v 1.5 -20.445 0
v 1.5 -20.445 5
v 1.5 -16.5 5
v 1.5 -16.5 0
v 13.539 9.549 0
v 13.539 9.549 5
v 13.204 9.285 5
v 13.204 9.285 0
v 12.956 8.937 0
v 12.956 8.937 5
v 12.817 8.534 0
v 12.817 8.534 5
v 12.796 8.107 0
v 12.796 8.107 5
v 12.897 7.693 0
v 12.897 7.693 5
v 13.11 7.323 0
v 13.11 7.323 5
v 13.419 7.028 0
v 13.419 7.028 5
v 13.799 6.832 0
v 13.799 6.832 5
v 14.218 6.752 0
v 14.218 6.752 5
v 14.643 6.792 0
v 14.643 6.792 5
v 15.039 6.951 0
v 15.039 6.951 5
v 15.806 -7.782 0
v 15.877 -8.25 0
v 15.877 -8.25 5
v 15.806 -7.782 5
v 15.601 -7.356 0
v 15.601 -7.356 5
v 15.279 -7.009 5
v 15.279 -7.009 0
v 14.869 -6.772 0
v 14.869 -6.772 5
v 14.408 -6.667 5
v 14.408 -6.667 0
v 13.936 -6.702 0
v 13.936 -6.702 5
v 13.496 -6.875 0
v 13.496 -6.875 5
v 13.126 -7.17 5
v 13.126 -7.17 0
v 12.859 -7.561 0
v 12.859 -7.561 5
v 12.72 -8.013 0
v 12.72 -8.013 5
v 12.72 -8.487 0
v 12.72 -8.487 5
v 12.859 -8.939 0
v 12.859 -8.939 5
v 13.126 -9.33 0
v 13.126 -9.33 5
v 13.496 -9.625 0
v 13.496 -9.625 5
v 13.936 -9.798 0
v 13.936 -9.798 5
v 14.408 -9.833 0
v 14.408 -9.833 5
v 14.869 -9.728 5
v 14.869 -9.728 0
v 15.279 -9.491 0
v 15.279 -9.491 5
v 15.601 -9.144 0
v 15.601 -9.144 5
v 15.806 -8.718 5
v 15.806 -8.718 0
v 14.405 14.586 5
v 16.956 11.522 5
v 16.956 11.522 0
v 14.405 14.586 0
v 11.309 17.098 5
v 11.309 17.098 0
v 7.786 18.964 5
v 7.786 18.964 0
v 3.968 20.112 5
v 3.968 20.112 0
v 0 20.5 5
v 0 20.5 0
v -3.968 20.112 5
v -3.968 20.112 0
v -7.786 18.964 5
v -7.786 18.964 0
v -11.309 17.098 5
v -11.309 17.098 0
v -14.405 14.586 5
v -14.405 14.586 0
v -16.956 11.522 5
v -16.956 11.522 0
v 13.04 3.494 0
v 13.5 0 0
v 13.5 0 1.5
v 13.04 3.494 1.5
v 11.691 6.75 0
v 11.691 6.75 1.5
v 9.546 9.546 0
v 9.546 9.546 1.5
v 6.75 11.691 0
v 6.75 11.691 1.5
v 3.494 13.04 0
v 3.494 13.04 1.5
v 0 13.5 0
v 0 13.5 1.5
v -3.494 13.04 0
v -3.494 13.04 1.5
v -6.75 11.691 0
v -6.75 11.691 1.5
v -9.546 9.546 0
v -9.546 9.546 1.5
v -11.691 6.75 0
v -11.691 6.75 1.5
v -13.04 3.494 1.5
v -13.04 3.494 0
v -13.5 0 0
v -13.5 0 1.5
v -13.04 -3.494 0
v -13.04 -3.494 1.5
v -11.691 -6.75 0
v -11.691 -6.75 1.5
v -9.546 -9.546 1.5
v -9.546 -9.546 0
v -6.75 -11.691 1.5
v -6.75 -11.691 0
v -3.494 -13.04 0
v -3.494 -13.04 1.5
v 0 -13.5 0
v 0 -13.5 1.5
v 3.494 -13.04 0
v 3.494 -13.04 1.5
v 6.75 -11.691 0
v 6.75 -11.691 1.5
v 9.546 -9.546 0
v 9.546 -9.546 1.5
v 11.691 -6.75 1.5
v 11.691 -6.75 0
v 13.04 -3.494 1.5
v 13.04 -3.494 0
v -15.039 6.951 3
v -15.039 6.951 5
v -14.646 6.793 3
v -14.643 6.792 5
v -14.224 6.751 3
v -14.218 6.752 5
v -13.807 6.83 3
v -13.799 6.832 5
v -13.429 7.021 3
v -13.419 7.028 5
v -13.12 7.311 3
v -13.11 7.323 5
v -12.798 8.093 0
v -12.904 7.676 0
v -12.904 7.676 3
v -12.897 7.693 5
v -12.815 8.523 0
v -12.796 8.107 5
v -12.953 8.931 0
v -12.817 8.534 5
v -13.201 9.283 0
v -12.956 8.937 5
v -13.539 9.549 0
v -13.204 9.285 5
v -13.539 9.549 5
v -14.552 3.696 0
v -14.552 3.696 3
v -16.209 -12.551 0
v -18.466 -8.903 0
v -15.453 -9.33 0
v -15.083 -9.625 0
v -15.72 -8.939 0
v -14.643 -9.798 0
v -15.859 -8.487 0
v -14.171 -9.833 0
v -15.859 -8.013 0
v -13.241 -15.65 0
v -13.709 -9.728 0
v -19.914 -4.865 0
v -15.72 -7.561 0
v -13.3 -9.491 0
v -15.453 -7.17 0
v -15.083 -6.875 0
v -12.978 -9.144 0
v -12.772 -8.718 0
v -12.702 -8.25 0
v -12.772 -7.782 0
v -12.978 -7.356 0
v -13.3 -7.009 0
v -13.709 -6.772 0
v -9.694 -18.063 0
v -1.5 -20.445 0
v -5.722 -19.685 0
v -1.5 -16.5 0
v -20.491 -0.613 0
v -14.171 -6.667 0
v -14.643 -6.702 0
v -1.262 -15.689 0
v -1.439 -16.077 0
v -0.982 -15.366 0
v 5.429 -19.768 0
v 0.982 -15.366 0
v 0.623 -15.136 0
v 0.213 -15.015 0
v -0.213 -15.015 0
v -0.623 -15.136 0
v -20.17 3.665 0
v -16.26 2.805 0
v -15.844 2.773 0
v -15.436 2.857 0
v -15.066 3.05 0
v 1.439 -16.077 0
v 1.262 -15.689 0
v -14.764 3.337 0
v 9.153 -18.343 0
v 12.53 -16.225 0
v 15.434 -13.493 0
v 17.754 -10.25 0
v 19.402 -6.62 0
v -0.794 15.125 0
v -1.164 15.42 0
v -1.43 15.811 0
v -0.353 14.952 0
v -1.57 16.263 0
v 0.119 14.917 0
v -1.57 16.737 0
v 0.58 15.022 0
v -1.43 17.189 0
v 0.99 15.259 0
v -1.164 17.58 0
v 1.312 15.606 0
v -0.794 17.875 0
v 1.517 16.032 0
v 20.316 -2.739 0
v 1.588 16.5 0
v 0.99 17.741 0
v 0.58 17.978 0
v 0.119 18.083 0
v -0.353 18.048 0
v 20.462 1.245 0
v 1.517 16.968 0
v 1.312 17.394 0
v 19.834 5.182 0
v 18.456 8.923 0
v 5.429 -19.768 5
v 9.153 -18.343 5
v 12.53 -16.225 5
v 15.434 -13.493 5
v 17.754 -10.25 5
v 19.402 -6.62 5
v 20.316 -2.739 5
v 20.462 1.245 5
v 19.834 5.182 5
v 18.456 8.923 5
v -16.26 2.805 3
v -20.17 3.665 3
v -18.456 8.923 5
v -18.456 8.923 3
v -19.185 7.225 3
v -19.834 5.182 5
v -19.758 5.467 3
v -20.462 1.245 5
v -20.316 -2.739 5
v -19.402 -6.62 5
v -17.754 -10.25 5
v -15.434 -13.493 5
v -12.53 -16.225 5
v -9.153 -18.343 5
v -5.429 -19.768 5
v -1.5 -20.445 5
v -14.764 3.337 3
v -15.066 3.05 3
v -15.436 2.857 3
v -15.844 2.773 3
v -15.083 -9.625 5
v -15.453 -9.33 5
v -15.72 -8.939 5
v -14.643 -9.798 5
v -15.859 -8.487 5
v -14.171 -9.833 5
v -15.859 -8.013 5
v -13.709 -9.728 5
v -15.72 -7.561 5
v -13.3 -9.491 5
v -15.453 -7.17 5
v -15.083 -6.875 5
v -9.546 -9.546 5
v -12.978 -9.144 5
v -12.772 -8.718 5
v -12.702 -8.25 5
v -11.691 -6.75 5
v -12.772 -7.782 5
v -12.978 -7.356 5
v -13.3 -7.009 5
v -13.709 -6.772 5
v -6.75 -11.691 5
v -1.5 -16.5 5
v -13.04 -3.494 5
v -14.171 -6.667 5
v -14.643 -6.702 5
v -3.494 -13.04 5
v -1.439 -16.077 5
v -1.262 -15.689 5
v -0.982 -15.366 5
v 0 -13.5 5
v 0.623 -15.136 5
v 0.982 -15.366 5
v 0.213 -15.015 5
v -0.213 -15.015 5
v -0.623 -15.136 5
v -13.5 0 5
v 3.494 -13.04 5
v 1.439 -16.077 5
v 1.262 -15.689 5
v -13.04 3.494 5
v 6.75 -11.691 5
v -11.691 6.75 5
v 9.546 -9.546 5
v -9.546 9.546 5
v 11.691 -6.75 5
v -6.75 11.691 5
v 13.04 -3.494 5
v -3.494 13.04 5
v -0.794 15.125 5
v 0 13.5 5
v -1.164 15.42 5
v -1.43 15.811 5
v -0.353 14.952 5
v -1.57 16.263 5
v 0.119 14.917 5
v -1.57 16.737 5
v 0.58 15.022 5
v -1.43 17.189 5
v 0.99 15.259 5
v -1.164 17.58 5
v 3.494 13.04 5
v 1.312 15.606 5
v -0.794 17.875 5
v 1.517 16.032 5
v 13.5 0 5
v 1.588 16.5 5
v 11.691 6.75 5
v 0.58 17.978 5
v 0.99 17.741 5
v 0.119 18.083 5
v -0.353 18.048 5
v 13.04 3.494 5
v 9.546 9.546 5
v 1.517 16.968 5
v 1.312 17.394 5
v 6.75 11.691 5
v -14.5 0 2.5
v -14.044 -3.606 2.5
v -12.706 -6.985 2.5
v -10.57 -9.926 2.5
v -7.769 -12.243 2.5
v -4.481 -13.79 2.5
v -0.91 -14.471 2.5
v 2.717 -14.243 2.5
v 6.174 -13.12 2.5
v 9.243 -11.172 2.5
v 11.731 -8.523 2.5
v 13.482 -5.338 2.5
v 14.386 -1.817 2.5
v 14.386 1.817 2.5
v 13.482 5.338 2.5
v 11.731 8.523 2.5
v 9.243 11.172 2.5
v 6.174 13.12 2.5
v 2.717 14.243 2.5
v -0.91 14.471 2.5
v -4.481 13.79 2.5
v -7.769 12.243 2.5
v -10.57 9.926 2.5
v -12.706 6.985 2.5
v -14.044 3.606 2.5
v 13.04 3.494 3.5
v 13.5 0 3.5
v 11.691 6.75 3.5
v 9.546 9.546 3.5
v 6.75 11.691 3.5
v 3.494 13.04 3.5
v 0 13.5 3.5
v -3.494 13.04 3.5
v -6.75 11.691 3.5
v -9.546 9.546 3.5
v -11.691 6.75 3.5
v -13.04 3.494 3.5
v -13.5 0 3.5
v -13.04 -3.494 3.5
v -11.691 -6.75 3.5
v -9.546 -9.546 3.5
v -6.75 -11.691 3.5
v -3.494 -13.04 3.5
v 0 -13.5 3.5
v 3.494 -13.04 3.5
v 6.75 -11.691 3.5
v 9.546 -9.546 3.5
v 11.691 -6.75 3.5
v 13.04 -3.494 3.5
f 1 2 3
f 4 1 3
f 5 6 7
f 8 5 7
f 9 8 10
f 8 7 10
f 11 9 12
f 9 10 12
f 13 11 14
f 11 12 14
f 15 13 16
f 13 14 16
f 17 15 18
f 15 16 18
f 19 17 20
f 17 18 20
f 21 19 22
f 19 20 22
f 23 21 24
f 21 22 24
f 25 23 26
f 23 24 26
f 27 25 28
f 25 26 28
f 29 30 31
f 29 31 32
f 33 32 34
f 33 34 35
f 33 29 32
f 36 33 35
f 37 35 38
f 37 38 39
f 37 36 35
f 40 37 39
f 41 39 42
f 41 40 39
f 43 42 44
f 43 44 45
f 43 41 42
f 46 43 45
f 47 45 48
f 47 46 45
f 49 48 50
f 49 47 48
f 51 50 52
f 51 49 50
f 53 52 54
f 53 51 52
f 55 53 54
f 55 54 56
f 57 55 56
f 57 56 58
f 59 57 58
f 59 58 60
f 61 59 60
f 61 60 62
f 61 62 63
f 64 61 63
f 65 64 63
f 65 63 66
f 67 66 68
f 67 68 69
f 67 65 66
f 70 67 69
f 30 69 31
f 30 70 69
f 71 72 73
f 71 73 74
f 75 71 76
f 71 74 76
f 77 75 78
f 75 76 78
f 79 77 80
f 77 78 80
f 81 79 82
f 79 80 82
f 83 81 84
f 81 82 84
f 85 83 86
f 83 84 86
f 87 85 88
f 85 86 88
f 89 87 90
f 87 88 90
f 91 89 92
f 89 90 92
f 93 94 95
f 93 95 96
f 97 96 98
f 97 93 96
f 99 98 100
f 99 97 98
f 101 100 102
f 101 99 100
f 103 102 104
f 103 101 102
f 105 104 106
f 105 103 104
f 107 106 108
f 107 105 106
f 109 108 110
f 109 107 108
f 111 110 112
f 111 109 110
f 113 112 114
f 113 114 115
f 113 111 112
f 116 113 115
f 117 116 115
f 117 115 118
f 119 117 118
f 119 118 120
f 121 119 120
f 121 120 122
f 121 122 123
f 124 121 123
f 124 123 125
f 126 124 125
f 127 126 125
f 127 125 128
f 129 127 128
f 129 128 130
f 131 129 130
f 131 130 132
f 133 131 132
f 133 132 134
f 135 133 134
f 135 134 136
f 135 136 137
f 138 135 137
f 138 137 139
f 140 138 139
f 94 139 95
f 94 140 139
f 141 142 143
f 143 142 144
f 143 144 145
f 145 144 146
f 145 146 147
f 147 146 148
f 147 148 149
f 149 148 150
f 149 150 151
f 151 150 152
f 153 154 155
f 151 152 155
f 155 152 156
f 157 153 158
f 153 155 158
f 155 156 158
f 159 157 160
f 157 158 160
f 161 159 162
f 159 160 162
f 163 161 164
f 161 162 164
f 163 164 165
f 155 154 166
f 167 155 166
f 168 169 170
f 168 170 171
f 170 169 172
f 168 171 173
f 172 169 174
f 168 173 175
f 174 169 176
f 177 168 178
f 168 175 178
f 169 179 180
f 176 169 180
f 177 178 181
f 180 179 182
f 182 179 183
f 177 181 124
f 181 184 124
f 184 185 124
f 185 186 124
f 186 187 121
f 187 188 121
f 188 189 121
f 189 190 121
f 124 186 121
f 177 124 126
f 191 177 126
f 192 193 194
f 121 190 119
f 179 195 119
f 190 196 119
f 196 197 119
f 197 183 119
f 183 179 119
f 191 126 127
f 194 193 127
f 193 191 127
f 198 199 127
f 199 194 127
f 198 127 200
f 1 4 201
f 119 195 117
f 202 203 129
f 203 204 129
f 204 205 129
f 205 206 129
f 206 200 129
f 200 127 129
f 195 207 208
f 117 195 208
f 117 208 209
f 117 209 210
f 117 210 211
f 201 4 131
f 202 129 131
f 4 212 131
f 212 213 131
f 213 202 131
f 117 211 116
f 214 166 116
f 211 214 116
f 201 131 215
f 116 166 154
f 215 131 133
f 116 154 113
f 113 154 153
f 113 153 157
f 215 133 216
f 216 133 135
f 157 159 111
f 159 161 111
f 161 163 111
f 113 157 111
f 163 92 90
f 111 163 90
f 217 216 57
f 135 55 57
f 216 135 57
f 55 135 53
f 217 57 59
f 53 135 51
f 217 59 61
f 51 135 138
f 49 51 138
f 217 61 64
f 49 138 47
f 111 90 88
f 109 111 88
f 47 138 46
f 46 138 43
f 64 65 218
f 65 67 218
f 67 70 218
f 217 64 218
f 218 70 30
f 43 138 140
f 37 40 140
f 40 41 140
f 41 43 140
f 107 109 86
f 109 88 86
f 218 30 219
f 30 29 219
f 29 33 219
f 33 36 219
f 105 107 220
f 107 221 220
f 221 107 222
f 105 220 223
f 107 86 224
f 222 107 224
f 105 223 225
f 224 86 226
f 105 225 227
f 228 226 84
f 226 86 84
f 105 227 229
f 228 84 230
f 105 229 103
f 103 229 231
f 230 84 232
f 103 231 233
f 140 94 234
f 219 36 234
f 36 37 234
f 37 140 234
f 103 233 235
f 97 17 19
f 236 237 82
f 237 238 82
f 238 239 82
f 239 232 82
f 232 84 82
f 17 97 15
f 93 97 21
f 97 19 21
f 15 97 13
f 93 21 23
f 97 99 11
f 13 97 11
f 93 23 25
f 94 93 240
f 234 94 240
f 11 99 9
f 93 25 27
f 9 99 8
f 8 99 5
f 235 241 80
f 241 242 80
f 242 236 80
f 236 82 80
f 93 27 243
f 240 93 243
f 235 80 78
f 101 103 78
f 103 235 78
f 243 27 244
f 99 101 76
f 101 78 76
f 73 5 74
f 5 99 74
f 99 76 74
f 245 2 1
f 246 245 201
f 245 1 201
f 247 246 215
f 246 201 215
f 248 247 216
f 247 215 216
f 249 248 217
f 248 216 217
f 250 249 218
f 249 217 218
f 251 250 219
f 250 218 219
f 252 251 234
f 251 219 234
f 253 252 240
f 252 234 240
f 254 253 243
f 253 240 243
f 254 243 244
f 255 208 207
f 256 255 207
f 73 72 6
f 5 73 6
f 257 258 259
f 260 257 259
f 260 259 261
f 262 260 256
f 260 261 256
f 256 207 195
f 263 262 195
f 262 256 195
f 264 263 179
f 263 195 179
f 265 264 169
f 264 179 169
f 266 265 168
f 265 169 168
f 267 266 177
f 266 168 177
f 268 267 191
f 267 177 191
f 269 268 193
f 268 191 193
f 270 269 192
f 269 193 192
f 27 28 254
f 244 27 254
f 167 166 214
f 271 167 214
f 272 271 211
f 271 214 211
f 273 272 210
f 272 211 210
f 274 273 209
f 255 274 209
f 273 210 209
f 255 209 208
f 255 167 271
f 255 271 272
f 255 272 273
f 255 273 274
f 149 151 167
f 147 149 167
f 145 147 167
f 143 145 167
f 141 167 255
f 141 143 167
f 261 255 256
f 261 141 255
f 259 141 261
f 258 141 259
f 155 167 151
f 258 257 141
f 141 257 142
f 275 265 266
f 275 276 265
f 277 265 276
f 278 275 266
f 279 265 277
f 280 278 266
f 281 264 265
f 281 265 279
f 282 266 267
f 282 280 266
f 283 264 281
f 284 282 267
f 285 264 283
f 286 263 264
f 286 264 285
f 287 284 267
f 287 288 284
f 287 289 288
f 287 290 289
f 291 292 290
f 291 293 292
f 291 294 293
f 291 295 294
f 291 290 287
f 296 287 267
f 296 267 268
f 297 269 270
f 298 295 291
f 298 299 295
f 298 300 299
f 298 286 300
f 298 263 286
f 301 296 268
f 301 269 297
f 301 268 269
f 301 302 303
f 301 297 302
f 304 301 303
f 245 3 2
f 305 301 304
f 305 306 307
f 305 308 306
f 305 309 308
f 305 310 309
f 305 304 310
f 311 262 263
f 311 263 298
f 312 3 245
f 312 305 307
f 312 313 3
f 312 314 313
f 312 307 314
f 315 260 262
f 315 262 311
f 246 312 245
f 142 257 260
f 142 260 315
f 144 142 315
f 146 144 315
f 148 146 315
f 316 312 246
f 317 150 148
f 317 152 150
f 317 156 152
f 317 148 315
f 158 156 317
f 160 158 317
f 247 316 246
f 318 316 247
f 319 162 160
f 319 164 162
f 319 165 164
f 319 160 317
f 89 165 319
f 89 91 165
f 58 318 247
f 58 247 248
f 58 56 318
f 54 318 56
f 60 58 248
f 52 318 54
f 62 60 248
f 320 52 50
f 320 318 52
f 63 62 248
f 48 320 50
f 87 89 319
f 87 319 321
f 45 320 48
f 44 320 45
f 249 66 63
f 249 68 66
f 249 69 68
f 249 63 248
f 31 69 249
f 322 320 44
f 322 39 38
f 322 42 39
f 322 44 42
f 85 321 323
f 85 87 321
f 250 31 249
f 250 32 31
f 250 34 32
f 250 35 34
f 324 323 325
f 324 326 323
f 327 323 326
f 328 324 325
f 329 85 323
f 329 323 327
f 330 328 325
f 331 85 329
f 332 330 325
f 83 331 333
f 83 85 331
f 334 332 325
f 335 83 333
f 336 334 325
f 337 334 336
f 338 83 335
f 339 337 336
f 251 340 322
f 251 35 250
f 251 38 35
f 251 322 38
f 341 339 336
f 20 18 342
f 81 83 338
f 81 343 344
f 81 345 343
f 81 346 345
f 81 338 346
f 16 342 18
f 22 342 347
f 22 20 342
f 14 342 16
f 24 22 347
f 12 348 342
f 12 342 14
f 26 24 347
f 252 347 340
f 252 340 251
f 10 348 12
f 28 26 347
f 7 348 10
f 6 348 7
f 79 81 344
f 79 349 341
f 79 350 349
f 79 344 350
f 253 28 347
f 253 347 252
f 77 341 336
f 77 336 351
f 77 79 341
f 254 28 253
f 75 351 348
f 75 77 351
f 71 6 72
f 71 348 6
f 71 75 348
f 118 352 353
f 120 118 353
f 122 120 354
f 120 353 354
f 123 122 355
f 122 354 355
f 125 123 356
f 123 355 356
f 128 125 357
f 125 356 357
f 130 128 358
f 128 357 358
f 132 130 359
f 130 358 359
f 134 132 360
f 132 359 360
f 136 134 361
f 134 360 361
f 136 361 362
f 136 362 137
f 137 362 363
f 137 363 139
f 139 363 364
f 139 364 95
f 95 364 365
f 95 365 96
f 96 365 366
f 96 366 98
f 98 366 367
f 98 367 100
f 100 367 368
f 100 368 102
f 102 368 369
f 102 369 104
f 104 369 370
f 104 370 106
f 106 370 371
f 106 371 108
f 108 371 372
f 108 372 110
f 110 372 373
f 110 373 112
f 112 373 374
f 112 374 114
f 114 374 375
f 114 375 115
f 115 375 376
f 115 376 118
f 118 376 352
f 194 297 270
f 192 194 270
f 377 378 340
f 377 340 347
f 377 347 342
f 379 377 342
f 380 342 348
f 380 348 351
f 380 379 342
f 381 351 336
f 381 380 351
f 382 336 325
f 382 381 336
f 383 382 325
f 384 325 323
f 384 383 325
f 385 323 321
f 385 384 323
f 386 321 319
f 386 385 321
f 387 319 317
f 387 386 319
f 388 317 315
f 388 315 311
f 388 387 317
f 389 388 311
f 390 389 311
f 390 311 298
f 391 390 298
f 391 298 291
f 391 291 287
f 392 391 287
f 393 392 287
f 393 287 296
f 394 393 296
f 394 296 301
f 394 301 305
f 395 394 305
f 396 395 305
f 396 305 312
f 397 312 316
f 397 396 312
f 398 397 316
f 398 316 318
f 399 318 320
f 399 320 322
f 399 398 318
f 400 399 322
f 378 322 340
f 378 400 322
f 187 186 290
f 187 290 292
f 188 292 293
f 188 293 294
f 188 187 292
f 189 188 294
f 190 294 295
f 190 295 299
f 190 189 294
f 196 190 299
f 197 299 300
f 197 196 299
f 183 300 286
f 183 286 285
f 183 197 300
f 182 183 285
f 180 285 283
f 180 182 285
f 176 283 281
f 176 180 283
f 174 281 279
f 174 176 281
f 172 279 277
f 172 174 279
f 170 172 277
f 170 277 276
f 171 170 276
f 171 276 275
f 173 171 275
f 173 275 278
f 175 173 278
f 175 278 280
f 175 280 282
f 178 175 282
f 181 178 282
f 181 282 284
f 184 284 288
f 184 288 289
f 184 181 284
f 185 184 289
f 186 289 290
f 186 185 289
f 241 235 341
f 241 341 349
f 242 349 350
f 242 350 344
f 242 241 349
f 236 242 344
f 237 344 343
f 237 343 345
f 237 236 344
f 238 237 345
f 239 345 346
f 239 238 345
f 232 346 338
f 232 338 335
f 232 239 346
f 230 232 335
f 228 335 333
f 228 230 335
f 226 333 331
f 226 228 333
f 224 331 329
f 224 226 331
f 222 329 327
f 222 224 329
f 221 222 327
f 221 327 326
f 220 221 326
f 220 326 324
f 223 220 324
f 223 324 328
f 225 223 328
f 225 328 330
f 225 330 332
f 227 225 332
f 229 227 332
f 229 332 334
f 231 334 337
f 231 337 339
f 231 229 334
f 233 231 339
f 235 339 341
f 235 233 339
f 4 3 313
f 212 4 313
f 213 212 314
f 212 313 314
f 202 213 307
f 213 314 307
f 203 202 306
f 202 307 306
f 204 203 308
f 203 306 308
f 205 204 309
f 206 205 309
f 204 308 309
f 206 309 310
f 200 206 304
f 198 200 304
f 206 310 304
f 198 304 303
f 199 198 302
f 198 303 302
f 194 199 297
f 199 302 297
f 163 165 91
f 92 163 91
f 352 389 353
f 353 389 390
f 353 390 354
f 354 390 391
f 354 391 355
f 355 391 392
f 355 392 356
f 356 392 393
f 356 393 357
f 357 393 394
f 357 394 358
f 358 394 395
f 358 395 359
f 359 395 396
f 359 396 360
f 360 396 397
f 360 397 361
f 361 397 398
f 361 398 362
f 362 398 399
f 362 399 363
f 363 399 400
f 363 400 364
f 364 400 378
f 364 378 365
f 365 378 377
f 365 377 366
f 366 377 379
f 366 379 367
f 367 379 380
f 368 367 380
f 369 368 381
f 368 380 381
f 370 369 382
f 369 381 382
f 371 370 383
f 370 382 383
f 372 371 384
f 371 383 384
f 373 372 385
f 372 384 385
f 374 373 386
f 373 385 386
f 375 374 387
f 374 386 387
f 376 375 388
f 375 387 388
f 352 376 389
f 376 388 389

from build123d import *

# Parameters (mm, degrees)
SKETCH1_R          = 20.5
SKETCH1_R_2        = 13.5
SKETCH1_R_3        = 1.5875
EXTRUDE1_DEPTH     = 5
CUT_EXTRUDE1_DEPTH = 30.419381367
CIRPATTERN1_COUNT  = 3
CUT_EXTRUDE2_DEPTH = 3


with BuildPart() as part:
    # Sketch1 → Extrude1 (new body)
    with BuildSketch(Plane.XY):
        Circle(SKETCH1_R)
        Circle(SKETCH1_R_2, mode=Mode.SUBTRACT)
        with Locations((0, 16.5)):
            Circle(SKETCH1_R_3, mode=Mode.SUBTRACT)
        with Locations((14.289419162, -8.25)):
            Circle(SKETCH1_R_3, mode=Mode.SUBTRACT)
        with Locations((-14.289419162, -8.25)):
            Circle(SKETCH1_R_3, mode=Mode.SUBTRACT)
    extrude(amount=EXTRUDE1_DEPTH)

    # Sketch2 → Cut-Extrude1 (cut, through all)
    with BuildSketch(Plane.XY.offset(5)):
        with BuildLine():
            ThreePointArc((1.5, -16.5), (0, -15), (-1.5, -16.5))
            Line((-1.5, -16.5), (-1.5, -20.4450483))
            ThreePointArc((-1.5, -20.4450483), (0, -20.5), (1.5, -20.4450483))
            Line((1.5, -20.4450483), (1.5, -16.5))
        make_face()
    cut_extrude1 = extrude(amount=-CUT_EXTRUDE1_DEPTH, mode=Mode.SUBTRACT)

    # Sketch4 → Cut-Revolve3 (revolve, cut)
    with BuildSketch(Plane(origin=(0, 0, 0), x_dir=(1, 0, 0), z_dir=(0, 1, 0))):
        Polygon((-13.5, -1.5), (-14.5, -2.5), (-13.5, -3.5), align=None)
    revolve(axis=Axis((0, 0, 0), (0, 0, 1)), mode=Mode.SUBTRACT)

    # CirPattern1: Cut-Extrude1 ×3 about axis
    cirpattern1_axis = Axis((0, 0, 5), (0, 0, -1))
    for i in range(1, CIRPATTERN1_COUNT):
        add(cut_extrude1.rotate(cirpattern1_axis, i * 360 / CIRPATTERN1_COUNT), mode=Mode.SUBTRACT)

    # Sketch5 → Cut-Extrude2 (cut)
    with BuildSketch(Plane(origin=(0, 0, 0), x_dir=(-1, 0, 0), z_dir=(0, 0, -1))):
        with BuildLine():
            Line((12.903599864, 7.675974851), (14.551956835, 3.696489096))
            ThreePointArc((14.551956835, 3.696489096), (15.24393144, 2.940634723), (16.259744852, 2.805476312))
            Line((16.259744852, 2.805476312), (20.169765215, 3.664774367))
            ThreePointArc((20.169765215, 3.664774367), (19.491013781, 6.352195037), (18.45593121, 8.923486044))
            Line((18.45593121, 8.923486044), (15.039419162, 6.950961894))
            ThreePointArc((15.039419162, 6.950961894), (13.807259964, 6.829604806), (12.903599864, 7.675974851))
        make_face()
    extrude(amount=-CUT_EXTRUDE2_DEPTH, mode=Mode.SUBTRACT)


solid = part.part
